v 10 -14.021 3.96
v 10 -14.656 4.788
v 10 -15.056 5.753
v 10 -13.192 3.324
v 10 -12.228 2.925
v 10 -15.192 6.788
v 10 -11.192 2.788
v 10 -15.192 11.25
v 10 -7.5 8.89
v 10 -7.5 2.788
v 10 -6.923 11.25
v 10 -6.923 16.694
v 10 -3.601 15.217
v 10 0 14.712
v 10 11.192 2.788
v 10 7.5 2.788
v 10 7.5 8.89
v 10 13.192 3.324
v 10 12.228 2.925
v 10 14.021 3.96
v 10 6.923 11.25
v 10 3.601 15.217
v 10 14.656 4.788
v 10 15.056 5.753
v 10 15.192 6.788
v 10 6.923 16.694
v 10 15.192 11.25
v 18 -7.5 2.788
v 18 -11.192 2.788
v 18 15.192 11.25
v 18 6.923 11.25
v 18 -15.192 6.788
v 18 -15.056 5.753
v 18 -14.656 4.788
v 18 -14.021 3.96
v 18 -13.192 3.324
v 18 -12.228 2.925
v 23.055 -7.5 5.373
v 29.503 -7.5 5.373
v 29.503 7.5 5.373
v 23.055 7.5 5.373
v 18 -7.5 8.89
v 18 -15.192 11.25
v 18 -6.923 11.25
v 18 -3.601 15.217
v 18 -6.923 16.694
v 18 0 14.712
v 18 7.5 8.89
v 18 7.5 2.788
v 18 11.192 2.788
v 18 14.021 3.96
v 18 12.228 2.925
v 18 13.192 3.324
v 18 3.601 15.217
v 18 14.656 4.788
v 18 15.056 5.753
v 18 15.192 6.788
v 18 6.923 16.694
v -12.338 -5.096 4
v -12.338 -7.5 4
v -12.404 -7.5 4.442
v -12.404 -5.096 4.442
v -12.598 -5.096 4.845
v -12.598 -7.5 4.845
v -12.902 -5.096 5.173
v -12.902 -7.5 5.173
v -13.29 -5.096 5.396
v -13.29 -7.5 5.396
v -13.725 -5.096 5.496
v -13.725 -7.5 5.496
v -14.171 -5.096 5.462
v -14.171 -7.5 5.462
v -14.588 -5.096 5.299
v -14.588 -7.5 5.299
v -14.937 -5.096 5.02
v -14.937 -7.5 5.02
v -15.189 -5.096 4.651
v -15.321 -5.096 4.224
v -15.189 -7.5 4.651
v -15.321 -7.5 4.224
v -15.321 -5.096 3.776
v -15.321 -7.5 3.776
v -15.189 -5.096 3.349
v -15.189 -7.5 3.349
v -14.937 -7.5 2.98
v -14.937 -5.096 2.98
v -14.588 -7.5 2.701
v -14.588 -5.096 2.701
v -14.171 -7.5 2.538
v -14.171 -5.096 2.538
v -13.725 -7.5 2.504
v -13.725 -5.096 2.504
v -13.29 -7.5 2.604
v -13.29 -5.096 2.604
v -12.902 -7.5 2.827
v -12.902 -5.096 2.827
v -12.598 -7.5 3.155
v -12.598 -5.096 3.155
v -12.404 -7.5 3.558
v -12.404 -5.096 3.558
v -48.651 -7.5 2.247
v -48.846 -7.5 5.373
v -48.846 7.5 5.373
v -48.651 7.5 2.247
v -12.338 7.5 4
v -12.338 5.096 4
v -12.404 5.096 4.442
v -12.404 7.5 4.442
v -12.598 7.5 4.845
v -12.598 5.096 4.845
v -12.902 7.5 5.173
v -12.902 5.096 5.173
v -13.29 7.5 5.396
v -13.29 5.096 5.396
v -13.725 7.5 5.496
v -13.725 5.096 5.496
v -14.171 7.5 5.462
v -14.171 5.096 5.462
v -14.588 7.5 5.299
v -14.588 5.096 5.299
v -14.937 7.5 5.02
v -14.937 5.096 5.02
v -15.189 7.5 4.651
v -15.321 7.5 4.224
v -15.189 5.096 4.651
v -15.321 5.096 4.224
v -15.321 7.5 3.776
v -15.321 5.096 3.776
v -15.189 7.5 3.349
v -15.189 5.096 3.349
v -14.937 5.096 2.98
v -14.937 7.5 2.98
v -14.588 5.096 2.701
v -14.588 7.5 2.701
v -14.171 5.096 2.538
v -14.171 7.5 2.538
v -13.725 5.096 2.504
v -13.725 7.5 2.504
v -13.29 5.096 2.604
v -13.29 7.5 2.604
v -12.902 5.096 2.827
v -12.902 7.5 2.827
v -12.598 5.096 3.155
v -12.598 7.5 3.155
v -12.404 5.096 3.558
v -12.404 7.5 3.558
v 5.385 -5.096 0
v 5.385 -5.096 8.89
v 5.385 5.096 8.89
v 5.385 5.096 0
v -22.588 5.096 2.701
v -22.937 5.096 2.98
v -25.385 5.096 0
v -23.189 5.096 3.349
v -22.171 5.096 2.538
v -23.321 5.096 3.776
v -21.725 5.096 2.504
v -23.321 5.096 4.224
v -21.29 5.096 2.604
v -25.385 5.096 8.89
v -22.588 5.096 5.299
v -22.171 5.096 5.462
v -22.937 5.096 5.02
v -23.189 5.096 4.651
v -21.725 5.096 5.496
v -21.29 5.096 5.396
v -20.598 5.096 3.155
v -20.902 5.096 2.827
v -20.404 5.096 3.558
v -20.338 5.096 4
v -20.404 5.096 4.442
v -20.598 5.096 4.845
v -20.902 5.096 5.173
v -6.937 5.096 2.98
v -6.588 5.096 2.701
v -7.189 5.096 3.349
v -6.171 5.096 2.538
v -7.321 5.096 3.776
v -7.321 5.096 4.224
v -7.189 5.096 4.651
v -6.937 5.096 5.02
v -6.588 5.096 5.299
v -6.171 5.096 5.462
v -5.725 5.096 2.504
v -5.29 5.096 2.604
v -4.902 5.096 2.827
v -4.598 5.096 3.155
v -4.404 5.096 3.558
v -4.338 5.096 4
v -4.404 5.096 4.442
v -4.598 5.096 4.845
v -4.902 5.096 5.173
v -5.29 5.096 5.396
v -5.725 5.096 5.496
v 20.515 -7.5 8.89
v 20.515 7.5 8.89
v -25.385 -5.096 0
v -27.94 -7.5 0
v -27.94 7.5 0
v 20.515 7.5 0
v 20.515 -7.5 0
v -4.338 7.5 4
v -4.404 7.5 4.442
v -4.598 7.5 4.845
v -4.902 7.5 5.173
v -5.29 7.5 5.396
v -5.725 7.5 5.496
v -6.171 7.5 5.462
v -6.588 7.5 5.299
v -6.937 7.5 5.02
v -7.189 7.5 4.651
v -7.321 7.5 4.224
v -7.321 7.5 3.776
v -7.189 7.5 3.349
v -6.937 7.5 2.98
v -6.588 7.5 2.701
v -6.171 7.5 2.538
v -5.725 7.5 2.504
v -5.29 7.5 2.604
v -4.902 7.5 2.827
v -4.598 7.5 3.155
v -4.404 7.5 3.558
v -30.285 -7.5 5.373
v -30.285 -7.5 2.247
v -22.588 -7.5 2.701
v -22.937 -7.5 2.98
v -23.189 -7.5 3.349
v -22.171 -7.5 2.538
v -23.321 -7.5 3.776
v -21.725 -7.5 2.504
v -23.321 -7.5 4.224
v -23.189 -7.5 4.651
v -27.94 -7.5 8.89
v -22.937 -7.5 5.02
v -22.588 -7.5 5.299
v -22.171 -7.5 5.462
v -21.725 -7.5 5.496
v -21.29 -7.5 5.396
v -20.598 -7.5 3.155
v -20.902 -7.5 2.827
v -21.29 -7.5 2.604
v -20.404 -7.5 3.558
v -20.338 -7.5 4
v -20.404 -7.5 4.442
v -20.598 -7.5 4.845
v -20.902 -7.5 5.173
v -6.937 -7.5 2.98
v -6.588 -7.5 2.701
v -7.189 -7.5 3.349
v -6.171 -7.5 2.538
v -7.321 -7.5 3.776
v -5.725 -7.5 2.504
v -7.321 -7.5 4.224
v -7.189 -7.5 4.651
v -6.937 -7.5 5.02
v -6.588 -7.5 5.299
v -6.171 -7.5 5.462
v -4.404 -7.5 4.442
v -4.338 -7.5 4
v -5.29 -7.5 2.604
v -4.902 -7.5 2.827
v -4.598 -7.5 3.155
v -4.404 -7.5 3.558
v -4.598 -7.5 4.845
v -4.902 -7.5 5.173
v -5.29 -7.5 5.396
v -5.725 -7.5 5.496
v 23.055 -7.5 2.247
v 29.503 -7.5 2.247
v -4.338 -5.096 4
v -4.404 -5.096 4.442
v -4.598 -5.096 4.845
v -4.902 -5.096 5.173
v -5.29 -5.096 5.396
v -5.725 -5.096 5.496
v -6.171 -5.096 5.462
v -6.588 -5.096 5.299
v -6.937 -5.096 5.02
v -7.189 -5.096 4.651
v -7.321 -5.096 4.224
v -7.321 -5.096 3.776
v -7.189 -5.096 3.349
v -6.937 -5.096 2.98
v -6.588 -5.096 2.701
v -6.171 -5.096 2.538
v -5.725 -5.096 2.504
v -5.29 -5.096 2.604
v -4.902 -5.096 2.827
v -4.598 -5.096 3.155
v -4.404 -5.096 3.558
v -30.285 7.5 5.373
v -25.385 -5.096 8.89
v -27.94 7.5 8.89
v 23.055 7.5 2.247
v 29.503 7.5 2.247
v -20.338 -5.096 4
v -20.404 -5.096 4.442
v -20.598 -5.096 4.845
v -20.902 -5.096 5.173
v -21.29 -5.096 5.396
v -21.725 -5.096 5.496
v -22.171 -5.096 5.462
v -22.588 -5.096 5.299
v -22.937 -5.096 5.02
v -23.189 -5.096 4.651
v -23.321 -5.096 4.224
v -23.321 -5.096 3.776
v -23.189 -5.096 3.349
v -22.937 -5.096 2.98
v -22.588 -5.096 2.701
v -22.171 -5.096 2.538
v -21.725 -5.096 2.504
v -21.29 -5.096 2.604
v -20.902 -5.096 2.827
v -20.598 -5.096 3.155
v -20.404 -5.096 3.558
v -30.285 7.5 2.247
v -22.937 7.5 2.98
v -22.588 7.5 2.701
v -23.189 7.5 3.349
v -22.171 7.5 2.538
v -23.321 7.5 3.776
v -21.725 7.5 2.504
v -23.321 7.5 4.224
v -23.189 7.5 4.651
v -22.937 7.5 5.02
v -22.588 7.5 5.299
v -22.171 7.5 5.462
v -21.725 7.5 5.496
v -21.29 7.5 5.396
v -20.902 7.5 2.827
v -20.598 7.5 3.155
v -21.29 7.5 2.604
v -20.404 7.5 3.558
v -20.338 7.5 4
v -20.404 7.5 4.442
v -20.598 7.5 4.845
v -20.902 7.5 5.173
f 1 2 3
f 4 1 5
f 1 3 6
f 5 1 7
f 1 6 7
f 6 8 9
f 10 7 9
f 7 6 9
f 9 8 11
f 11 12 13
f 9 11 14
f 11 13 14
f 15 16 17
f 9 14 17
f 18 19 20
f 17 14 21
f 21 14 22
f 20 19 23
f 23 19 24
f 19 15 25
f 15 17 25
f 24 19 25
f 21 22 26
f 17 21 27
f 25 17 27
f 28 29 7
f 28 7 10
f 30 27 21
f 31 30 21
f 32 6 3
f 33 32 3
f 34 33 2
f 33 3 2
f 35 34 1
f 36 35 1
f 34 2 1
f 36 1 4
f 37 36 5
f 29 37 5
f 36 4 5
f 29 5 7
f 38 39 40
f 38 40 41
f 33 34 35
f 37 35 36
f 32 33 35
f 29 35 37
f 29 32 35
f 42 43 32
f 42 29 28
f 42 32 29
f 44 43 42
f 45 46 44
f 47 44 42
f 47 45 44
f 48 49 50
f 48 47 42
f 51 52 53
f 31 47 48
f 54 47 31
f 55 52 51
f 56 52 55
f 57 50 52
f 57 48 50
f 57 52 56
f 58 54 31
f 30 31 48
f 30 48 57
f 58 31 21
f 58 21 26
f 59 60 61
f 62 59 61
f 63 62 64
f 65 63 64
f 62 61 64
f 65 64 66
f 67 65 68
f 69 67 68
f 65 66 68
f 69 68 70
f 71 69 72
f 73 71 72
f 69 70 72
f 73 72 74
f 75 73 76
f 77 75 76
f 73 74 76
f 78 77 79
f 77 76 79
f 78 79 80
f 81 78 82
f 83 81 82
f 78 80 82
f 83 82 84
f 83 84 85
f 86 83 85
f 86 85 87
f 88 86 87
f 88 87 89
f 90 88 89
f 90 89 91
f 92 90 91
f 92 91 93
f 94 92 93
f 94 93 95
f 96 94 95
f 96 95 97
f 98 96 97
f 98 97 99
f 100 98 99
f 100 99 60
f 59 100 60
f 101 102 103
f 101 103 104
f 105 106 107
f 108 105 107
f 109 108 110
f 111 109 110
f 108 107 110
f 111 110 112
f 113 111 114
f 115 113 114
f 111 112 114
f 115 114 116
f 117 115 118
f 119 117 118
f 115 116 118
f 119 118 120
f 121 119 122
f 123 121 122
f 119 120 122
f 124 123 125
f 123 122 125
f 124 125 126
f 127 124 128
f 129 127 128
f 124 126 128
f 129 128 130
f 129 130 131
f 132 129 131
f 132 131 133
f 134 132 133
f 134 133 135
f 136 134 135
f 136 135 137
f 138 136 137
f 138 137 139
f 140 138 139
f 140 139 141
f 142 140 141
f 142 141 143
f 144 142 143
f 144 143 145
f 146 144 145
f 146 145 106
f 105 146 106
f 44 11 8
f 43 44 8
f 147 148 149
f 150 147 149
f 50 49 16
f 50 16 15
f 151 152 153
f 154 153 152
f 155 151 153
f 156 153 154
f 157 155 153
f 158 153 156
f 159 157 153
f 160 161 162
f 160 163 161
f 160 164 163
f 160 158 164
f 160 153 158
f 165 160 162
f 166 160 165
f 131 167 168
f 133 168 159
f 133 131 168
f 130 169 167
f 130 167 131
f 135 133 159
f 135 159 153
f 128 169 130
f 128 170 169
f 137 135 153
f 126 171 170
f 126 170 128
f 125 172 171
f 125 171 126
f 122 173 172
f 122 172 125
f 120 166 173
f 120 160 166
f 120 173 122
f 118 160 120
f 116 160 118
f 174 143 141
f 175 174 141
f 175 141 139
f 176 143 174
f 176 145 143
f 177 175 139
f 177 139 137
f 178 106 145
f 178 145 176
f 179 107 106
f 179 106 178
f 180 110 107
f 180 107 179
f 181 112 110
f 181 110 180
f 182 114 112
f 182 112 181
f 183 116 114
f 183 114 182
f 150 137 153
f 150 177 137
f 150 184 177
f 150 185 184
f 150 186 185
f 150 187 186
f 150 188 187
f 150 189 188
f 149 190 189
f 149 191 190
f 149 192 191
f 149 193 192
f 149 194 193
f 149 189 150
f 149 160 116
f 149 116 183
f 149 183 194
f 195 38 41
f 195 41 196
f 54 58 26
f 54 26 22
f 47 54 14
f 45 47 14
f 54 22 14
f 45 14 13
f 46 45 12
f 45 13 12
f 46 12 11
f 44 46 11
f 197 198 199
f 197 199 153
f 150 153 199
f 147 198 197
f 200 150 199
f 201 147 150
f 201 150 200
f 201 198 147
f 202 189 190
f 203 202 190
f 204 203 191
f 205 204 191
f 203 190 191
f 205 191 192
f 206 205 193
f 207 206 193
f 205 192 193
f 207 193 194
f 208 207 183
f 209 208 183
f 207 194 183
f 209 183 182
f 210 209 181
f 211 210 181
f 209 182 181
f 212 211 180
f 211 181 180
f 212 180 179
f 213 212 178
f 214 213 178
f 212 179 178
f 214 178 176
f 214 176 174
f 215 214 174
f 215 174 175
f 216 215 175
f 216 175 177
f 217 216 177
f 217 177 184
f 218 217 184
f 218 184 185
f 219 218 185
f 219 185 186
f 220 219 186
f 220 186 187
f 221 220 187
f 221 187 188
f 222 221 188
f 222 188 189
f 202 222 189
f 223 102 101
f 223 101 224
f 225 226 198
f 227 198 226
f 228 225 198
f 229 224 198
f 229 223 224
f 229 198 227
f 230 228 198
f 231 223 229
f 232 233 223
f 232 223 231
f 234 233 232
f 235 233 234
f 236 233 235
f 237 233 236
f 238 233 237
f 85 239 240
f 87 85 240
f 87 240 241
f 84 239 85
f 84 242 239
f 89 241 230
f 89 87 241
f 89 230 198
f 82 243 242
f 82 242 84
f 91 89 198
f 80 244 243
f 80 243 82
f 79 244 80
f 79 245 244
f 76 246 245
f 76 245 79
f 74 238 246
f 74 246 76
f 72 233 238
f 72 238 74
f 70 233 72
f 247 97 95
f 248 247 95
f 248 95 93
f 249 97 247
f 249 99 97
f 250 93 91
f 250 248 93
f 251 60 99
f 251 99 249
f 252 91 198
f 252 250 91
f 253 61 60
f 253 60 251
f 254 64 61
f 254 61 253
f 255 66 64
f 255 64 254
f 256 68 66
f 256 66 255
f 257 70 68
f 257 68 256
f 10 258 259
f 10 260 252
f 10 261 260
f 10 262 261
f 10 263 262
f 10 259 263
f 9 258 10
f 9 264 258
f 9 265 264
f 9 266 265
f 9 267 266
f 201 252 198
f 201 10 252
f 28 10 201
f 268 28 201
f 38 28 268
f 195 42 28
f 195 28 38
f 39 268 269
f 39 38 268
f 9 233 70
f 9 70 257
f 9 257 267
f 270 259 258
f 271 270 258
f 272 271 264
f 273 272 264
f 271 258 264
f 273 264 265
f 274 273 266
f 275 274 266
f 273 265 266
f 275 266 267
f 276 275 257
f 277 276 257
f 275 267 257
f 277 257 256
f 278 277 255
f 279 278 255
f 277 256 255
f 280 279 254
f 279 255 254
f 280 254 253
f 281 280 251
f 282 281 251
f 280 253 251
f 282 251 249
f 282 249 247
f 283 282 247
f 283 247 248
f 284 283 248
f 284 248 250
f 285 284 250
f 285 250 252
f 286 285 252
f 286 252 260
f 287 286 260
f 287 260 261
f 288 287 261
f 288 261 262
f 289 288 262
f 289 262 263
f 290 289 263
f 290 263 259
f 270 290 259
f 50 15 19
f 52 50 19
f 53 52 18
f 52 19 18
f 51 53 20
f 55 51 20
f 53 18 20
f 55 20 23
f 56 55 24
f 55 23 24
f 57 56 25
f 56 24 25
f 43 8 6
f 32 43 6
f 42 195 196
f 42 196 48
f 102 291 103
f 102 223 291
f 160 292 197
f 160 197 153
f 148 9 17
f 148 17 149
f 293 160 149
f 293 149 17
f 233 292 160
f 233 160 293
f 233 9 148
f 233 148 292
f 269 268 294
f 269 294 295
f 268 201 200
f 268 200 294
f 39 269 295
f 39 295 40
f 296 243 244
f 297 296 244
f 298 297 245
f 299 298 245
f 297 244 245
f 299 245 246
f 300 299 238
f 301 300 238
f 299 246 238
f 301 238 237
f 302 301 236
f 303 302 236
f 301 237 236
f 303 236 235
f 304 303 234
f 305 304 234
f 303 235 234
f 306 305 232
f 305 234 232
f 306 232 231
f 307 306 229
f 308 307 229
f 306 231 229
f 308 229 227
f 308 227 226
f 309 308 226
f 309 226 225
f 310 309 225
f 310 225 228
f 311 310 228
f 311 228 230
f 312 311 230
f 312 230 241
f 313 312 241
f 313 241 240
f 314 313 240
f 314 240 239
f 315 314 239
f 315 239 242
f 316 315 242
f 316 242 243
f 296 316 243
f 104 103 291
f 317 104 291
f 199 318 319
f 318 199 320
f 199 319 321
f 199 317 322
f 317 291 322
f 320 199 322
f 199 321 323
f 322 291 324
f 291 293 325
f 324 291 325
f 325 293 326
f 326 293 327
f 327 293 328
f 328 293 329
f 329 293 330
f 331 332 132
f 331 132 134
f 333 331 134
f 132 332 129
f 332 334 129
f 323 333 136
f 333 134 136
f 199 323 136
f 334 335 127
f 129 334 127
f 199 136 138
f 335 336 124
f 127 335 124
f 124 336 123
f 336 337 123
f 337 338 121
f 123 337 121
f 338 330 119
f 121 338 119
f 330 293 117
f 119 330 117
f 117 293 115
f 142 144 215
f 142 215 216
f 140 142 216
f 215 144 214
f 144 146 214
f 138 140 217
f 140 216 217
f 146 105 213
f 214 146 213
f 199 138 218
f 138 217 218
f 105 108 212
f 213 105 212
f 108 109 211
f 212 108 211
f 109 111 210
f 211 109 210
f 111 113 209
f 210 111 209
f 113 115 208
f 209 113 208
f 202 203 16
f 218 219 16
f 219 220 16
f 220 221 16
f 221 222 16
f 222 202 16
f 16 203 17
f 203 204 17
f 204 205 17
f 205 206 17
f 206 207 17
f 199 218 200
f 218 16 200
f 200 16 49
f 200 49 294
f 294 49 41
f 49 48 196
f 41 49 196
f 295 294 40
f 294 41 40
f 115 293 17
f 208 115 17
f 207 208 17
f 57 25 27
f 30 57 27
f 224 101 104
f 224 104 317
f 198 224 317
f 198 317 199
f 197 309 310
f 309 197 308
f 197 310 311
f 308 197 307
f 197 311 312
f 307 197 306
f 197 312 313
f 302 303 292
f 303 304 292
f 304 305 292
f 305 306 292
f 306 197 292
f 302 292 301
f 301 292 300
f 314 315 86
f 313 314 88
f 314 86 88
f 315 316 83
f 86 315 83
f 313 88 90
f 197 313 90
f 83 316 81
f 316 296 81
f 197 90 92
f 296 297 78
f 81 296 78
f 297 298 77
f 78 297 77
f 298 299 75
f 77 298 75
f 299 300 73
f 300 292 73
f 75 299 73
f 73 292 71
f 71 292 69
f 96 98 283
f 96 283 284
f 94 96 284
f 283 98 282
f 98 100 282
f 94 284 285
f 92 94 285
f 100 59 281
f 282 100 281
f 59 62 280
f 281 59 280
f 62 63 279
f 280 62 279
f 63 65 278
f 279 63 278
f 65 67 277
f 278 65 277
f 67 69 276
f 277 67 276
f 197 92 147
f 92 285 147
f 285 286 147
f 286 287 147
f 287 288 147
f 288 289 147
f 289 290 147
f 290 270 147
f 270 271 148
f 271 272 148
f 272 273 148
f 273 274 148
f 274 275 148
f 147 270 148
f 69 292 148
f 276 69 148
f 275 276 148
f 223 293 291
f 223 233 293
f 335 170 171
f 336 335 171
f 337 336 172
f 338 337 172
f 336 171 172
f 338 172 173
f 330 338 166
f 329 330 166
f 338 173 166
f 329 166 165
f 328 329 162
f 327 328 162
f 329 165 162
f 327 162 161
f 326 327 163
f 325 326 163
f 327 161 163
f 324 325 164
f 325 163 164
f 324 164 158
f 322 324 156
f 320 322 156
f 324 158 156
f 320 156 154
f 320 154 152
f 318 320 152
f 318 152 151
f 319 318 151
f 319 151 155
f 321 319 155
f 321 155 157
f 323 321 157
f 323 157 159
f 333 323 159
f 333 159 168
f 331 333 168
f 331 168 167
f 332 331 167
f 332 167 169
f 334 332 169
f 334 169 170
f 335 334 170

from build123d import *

# Parameters (mm, degrees)
F1_DEPTH = 7.5
F2_W     = 30.769231
F2_H     = 10.192308
F3_DEPTH = 8.891
F6_DEPTH = 8
F7_R     = 1.5
F8_DEPTH = 22.693308


with BuildPart() as f1:
    # F0 (on Front) → F1 (new body, symmetric)
    with BuildSketch(Plane.XZ):
        Polygon((-30.284615, 5.373077), (-48.846155, 5.373077), (-48.650771, 2.246923), (-30.284615, 2.246923), (-27.939999, 0), (20.515386, 0), (23.055386, 2.246923), (29.503077, 2.246923), (29.503077, 5.373077), (23.055386, 5.373077), (20.515386, 8.89), (-27.939999, 8.89), align=None)
    extrude(amount=F1_DEPTH, both=True)

    # F2 (on face) → F3 (cut, through all)
    with BuildSketch(Plane.XY.offset(8.89)):
        with Locations((-10, 0)):
            Rectangle(F2_W, F2_H)
    extrude(amount=-F3_DEPTH, mode=Mode.SUBTRACT)

    # F5 (on offset) → F6 (join)
    with BuildSketch(Plane.YZ.offset(10)):
        with BuildLine():
            ThreePointArc((-15.192308, 6.788462), (-14.020736, 3.960035), (-11.192308, 2.788462))
            Line((-11.192308, 2.788462), (11.192308, 2.788462))
            ThreePointArc((11.192308, 2.788462), (14.020736, 3.960035), (15.192308, 6.788462))
            Line((15.192308, 6.788462), (15.192308, 11.25))
            Line((15.192308, 11.25), (6.923077, 11.25))
            Line((6.923077, 11.25), (6.923077, 16.694458))
            ThreePointArc((6.923077, 16.694458), (0, 14.711539), (-6.923077, 16.694458))
            Line((-6.923077, 16.694458), (-6.923077, 11.25))
            Line((-6.923077, 11.25), (-15.192308, 11.25))
            Line((-15.192308, 11.25), (-15.192308, 6.788462))
        make_face()
    extrude(amount=F6_DEPTH)

    # F7 (on face) → F8 (cut, through all)
    with BuildSketch(Plane.XZ.offset(7.5)):
        with Locations((-21.837588, 4)):
            Circle(F7_R)
        with Locations((-13.837588, 4)):
            Circle(F7_R)
        with Locations((-5.837588, 4)):
            Circle(F7_R)
    extrude(amount=-F8_DEPTH, mode=Mode.SUBTRACT)


solid = f1.part
